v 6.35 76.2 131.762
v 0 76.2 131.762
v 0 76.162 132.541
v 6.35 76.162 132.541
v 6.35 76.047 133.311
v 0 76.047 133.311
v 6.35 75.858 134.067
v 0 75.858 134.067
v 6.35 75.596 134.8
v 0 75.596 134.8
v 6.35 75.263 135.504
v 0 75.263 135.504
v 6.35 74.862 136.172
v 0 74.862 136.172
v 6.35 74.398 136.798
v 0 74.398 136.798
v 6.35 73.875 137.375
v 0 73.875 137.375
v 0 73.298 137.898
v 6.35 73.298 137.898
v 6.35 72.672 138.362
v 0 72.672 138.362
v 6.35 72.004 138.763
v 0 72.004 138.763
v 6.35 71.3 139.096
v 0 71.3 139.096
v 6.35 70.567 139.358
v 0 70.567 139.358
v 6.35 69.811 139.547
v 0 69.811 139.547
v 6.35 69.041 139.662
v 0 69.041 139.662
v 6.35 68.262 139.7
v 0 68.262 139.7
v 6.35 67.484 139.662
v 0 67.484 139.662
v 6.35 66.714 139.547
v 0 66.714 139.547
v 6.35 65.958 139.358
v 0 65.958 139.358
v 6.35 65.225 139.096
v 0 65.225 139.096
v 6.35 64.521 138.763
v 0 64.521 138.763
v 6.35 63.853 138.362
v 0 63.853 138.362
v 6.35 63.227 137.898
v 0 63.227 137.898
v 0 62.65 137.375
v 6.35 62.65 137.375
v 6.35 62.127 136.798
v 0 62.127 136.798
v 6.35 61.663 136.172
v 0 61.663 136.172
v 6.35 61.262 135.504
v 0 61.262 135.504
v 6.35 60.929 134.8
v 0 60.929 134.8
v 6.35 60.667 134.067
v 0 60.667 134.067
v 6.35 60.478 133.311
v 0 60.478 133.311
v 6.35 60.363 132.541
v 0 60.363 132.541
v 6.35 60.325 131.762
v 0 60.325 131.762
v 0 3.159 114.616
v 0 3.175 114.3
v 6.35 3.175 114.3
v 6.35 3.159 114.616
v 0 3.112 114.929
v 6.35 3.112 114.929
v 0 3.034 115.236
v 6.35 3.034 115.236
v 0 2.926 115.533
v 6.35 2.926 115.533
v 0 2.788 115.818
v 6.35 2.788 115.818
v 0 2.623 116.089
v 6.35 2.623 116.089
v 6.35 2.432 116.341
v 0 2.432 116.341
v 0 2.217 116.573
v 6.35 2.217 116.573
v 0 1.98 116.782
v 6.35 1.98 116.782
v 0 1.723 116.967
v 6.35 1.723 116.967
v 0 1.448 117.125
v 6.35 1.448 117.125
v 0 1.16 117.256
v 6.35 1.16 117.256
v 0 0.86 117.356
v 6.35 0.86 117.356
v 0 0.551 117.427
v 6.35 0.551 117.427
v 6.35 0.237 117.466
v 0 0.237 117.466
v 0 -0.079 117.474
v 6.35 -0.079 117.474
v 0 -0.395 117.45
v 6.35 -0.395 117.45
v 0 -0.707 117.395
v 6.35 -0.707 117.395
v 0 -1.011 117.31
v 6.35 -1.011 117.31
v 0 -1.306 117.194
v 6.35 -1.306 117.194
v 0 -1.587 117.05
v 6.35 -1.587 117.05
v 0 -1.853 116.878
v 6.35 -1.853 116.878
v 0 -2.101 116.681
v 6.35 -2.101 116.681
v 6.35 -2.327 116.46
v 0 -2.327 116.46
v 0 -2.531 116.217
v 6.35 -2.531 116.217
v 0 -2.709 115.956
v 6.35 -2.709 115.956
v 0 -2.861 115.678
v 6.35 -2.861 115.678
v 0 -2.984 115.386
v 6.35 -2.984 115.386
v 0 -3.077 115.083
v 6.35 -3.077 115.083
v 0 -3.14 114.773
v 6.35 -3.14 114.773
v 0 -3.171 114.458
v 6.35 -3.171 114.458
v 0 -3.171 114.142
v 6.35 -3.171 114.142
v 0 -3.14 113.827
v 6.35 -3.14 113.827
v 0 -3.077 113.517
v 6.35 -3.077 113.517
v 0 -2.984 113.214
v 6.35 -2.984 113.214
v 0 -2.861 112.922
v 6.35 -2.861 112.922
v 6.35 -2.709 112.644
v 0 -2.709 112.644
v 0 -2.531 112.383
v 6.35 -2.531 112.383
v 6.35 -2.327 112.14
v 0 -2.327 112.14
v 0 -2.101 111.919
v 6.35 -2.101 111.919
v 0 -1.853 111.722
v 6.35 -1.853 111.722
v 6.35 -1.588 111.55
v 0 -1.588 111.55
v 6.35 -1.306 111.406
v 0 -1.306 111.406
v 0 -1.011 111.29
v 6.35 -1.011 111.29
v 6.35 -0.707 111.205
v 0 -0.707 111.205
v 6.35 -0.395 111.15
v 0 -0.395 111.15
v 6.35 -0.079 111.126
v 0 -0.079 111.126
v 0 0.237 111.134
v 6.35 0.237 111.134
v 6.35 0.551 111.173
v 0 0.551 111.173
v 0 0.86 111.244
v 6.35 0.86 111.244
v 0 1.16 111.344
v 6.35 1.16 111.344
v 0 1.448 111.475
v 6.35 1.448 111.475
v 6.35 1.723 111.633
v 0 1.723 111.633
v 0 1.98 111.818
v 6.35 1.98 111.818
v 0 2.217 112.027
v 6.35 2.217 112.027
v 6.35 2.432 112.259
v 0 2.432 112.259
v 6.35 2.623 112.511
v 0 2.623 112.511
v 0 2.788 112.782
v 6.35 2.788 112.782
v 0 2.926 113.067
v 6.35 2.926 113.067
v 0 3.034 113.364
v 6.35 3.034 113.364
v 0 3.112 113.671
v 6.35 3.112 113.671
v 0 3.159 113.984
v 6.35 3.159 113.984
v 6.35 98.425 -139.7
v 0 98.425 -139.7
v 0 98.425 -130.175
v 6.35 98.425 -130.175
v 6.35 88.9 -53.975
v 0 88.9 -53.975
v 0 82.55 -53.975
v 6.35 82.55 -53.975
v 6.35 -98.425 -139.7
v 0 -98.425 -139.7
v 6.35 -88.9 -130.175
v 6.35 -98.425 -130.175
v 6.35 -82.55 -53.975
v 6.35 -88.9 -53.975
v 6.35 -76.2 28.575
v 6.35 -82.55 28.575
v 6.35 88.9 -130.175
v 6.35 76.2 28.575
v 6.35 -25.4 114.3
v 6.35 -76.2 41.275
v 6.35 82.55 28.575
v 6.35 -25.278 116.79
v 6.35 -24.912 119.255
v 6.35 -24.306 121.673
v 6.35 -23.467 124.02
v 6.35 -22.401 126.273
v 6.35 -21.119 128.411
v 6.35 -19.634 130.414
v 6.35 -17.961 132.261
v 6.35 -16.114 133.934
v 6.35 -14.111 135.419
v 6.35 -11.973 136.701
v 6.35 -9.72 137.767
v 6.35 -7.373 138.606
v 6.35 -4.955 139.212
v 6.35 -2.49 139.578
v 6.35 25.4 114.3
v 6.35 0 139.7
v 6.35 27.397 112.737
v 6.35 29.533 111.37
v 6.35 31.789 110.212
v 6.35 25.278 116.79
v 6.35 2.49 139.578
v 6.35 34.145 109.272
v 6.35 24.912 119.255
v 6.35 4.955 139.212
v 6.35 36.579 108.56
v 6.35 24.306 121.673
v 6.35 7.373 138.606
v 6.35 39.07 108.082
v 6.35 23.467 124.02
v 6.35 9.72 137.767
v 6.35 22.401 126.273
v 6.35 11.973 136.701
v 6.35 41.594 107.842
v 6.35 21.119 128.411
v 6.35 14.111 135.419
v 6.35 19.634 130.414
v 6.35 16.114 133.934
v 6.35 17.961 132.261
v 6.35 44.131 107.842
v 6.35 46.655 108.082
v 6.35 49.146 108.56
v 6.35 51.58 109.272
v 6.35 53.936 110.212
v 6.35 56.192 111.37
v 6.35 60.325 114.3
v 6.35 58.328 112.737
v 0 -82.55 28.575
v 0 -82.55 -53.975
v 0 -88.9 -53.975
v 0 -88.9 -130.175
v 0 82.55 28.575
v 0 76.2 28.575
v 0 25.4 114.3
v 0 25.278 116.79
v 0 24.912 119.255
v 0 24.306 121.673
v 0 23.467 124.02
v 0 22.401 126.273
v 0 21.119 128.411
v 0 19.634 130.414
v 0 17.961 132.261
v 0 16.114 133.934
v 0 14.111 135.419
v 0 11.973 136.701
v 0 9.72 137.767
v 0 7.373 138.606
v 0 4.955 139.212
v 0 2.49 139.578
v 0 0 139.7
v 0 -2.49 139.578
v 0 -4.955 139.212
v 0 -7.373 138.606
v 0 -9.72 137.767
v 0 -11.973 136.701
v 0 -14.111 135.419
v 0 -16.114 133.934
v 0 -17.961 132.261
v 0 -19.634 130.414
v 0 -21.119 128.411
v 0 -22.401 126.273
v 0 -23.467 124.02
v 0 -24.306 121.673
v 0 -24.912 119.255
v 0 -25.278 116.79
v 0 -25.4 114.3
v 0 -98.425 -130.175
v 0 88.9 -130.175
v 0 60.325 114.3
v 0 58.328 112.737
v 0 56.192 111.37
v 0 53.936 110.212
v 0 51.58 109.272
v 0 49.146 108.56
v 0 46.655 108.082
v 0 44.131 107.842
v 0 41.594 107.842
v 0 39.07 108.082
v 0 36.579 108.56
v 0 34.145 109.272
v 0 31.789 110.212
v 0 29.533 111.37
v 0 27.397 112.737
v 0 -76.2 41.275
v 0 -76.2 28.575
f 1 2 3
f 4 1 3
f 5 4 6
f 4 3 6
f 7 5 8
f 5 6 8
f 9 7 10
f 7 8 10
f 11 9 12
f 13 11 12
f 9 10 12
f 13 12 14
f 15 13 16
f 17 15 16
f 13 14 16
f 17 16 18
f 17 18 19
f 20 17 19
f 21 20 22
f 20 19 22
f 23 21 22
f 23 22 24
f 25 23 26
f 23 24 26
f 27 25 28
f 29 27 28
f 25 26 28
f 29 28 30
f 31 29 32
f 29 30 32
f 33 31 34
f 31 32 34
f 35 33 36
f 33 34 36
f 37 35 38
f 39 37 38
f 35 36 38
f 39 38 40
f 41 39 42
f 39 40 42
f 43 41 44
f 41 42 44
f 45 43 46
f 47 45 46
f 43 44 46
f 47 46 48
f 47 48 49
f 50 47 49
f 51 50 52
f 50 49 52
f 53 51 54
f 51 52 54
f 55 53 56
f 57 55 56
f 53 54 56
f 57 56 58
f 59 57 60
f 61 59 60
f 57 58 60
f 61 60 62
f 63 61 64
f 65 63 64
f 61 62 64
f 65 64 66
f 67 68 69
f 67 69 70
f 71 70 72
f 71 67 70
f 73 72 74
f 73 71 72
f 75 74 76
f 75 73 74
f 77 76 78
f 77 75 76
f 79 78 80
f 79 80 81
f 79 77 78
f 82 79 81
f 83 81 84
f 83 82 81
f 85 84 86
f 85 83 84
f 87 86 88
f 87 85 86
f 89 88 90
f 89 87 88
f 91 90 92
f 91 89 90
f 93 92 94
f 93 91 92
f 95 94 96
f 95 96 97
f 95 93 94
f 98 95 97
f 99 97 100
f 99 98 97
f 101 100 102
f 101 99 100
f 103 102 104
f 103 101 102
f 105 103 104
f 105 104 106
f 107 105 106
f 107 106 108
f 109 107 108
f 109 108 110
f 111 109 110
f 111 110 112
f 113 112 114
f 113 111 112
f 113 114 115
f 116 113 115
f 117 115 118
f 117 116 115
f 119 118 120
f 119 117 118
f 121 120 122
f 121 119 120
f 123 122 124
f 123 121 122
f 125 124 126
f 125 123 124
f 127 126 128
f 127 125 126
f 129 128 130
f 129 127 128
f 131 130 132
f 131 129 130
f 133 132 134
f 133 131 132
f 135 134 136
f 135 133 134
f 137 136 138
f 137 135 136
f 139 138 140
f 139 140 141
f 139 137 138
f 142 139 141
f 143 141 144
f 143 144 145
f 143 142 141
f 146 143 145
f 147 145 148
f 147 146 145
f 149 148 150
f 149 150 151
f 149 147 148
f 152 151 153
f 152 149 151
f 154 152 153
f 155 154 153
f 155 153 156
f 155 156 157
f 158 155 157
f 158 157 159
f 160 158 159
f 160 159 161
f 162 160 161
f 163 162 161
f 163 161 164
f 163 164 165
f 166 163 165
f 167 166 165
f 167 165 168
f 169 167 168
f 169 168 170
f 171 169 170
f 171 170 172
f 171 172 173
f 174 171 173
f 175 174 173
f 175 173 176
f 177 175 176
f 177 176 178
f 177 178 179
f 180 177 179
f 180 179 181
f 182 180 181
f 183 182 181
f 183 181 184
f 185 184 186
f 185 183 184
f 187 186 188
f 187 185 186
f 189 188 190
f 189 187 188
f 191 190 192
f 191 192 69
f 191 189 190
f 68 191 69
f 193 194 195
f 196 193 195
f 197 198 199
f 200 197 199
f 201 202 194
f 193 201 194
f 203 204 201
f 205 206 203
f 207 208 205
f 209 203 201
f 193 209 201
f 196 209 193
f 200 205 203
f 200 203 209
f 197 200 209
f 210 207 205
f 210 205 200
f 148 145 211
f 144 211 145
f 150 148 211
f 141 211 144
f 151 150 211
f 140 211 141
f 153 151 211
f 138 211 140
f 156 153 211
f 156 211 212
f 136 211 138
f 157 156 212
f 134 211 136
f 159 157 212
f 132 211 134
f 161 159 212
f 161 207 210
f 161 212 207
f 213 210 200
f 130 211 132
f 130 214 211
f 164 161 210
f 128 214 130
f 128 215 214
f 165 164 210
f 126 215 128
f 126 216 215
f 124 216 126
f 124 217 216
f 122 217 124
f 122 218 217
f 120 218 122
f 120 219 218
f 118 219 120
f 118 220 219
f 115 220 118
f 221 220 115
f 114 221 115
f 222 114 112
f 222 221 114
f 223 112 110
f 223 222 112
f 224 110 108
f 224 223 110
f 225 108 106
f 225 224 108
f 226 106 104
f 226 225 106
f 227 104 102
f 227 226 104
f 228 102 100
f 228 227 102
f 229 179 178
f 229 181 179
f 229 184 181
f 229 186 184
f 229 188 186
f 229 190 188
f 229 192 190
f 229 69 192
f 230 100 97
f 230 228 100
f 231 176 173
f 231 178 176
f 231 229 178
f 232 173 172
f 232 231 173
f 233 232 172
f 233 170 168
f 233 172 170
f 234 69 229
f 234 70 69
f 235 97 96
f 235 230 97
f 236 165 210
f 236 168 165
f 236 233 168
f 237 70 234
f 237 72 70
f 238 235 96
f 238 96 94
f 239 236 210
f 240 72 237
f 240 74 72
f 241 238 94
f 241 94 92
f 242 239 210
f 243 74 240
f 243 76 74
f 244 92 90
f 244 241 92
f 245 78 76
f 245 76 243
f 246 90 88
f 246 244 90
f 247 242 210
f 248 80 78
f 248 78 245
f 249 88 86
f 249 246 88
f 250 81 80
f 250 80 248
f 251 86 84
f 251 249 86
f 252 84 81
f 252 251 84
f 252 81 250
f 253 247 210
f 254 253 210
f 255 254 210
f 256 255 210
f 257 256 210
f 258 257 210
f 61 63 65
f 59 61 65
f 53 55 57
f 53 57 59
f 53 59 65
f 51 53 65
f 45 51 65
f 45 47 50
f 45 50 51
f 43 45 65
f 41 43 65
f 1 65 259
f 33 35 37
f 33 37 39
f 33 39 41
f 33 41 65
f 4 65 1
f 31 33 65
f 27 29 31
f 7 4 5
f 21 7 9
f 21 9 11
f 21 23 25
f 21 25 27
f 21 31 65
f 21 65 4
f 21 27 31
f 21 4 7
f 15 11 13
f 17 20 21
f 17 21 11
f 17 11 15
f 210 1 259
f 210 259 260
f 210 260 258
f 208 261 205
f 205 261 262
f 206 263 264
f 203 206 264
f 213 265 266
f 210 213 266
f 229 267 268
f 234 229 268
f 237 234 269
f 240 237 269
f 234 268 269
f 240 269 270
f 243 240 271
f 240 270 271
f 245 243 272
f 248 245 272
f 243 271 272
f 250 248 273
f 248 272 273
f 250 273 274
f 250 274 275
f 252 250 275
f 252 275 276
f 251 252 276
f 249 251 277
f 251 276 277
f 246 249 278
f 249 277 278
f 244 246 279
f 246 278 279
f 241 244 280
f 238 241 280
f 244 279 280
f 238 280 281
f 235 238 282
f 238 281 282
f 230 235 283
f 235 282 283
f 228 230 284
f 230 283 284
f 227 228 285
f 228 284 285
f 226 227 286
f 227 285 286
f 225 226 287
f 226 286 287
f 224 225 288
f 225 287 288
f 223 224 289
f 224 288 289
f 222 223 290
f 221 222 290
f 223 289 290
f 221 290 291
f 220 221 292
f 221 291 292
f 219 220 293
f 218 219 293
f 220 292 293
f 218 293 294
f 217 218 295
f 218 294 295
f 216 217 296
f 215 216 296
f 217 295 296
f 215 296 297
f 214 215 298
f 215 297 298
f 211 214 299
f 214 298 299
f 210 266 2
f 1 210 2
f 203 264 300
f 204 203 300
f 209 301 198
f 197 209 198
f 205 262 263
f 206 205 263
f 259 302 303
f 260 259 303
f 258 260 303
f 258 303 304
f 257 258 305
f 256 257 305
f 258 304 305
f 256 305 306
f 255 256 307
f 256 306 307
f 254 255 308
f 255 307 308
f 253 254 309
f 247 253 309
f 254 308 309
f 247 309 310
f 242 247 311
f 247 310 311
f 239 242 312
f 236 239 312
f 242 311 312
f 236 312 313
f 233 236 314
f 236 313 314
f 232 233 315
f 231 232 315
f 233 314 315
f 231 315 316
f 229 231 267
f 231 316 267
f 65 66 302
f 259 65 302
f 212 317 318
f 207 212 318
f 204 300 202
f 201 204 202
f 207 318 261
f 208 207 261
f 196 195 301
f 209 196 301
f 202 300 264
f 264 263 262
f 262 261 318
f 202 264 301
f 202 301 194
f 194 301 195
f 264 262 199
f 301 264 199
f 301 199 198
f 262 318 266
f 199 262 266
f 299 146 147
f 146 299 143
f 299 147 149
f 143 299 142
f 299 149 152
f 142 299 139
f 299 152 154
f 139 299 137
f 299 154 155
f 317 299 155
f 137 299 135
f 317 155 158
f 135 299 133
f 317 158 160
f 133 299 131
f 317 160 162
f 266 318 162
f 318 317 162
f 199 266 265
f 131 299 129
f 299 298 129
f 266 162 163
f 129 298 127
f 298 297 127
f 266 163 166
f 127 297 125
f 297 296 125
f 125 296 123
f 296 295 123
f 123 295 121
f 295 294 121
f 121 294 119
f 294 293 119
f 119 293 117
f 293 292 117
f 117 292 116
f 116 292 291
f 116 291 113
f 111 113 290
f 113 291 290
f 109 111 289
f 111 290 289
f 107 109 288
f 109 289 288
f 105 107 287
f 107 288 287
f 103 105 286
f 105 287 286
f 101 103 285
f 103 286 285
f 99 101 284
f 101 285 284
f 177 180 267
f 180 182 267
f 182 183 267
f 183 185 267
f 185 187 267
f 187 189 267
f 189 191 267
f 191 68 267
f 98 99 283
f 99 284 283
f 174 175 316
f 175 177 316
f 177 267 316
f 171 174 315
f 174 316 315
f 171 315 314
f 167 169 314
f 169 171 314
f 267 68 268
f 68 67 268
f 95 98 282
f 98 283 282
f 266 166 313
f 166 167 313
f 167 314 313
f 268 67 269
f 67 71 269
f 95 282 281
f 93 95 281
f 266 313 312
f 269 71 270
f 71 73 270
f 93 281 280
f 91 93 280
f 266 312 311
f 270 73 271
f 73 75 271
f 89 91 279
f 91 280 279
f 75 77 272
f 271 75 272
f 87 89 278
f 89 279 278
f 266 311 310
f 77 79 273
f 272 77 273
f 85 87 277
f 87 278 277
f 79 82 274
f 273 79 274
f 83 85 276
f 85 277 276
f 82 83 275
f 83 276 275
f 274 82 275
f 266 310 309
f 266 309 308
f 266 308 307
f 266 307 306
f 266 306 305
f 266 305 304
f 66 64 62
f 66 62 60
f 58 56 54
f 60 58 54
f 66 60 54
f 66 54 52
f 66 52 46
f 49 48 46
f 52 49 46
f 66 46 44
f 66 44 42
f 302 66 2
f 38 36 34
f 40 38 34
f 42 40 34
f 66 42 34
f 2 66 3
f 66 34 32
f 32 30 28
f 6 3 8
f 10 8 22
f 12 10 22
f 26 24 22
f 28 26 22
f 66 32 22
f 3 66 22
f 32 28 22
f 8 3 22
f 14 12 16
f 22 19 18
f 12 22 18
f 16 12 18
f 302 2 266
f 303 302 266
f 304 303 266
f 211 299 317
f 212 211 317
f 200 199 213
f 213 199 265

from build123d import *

# Parameters (mm, degrees)
F0_R     = 3.175
F1_DEPTH = 6.35


# Not quite as in the source:
# - ends of sketch curves that miss each other by under 0.0002 mm in the source are joined


with BuildPart() as f1:
    # F0 (on Right) → F1 (new body)
    with BuildSketch(Plane.YZ):
        with BuildLine():
            Line((-88.9, -53.975), (-88.9, -130.175))
            Line((-88.9, -130.175), (-98.425, -130.175))
            Line((-98.425, -130.175), (-98.425, -139.7))
            Line((-98.425, -139.7), (98.425, -139.7))
            Line((98.425, -139.7), (98.425, -130.175))
            Line((98.425, -130.175), (88.9, -130.175))
            Line((88.9, -130.175), (88.9, -53.975))
            Line((88.9, -53.975), (82.55, -53.975))
            Line((82.55, -53.975), (82.55, 28.575))
            Line((82.55, 28.575), (76.2, 28.575))
            Line((76.2, 28.575), (76.2, 34.925))
            Line((76.2, 34.925), (76.2, 131.7625))
            ThreePointArc((76.2, 131.7625), (68.2625, 139.7), (60.325, 131.7625))
            Line((60.325, 131.7625), (60.325, 114.3))
            ThreePointArc((60.325, 114.3), (42.8625, 107.8115954), (25.3999938624, 114.299992881))
            ThreePointArc((25.3999938624, 114.299992881), (0, 139.7), (-25.4, 114.3))
            Line((-25.4, 114.3), (-76.2, 41.275))
            Line((-76.2, 41.275), (-76.2, 28.575))
            Line((-76.2, 28.575), (-82.55, 28.575))
            Line((-82.55, 28.575), (-82.55, -53.975))
            Line((-82.55, -53.975), (-88.9, -53.975))
        make_face()
        with Locations((0, 114.3)):
            Circle(F0_R, mode=Mode.SUBTRACT)
    extrude(amount=F1_DEPTH)


solid = f1.part
